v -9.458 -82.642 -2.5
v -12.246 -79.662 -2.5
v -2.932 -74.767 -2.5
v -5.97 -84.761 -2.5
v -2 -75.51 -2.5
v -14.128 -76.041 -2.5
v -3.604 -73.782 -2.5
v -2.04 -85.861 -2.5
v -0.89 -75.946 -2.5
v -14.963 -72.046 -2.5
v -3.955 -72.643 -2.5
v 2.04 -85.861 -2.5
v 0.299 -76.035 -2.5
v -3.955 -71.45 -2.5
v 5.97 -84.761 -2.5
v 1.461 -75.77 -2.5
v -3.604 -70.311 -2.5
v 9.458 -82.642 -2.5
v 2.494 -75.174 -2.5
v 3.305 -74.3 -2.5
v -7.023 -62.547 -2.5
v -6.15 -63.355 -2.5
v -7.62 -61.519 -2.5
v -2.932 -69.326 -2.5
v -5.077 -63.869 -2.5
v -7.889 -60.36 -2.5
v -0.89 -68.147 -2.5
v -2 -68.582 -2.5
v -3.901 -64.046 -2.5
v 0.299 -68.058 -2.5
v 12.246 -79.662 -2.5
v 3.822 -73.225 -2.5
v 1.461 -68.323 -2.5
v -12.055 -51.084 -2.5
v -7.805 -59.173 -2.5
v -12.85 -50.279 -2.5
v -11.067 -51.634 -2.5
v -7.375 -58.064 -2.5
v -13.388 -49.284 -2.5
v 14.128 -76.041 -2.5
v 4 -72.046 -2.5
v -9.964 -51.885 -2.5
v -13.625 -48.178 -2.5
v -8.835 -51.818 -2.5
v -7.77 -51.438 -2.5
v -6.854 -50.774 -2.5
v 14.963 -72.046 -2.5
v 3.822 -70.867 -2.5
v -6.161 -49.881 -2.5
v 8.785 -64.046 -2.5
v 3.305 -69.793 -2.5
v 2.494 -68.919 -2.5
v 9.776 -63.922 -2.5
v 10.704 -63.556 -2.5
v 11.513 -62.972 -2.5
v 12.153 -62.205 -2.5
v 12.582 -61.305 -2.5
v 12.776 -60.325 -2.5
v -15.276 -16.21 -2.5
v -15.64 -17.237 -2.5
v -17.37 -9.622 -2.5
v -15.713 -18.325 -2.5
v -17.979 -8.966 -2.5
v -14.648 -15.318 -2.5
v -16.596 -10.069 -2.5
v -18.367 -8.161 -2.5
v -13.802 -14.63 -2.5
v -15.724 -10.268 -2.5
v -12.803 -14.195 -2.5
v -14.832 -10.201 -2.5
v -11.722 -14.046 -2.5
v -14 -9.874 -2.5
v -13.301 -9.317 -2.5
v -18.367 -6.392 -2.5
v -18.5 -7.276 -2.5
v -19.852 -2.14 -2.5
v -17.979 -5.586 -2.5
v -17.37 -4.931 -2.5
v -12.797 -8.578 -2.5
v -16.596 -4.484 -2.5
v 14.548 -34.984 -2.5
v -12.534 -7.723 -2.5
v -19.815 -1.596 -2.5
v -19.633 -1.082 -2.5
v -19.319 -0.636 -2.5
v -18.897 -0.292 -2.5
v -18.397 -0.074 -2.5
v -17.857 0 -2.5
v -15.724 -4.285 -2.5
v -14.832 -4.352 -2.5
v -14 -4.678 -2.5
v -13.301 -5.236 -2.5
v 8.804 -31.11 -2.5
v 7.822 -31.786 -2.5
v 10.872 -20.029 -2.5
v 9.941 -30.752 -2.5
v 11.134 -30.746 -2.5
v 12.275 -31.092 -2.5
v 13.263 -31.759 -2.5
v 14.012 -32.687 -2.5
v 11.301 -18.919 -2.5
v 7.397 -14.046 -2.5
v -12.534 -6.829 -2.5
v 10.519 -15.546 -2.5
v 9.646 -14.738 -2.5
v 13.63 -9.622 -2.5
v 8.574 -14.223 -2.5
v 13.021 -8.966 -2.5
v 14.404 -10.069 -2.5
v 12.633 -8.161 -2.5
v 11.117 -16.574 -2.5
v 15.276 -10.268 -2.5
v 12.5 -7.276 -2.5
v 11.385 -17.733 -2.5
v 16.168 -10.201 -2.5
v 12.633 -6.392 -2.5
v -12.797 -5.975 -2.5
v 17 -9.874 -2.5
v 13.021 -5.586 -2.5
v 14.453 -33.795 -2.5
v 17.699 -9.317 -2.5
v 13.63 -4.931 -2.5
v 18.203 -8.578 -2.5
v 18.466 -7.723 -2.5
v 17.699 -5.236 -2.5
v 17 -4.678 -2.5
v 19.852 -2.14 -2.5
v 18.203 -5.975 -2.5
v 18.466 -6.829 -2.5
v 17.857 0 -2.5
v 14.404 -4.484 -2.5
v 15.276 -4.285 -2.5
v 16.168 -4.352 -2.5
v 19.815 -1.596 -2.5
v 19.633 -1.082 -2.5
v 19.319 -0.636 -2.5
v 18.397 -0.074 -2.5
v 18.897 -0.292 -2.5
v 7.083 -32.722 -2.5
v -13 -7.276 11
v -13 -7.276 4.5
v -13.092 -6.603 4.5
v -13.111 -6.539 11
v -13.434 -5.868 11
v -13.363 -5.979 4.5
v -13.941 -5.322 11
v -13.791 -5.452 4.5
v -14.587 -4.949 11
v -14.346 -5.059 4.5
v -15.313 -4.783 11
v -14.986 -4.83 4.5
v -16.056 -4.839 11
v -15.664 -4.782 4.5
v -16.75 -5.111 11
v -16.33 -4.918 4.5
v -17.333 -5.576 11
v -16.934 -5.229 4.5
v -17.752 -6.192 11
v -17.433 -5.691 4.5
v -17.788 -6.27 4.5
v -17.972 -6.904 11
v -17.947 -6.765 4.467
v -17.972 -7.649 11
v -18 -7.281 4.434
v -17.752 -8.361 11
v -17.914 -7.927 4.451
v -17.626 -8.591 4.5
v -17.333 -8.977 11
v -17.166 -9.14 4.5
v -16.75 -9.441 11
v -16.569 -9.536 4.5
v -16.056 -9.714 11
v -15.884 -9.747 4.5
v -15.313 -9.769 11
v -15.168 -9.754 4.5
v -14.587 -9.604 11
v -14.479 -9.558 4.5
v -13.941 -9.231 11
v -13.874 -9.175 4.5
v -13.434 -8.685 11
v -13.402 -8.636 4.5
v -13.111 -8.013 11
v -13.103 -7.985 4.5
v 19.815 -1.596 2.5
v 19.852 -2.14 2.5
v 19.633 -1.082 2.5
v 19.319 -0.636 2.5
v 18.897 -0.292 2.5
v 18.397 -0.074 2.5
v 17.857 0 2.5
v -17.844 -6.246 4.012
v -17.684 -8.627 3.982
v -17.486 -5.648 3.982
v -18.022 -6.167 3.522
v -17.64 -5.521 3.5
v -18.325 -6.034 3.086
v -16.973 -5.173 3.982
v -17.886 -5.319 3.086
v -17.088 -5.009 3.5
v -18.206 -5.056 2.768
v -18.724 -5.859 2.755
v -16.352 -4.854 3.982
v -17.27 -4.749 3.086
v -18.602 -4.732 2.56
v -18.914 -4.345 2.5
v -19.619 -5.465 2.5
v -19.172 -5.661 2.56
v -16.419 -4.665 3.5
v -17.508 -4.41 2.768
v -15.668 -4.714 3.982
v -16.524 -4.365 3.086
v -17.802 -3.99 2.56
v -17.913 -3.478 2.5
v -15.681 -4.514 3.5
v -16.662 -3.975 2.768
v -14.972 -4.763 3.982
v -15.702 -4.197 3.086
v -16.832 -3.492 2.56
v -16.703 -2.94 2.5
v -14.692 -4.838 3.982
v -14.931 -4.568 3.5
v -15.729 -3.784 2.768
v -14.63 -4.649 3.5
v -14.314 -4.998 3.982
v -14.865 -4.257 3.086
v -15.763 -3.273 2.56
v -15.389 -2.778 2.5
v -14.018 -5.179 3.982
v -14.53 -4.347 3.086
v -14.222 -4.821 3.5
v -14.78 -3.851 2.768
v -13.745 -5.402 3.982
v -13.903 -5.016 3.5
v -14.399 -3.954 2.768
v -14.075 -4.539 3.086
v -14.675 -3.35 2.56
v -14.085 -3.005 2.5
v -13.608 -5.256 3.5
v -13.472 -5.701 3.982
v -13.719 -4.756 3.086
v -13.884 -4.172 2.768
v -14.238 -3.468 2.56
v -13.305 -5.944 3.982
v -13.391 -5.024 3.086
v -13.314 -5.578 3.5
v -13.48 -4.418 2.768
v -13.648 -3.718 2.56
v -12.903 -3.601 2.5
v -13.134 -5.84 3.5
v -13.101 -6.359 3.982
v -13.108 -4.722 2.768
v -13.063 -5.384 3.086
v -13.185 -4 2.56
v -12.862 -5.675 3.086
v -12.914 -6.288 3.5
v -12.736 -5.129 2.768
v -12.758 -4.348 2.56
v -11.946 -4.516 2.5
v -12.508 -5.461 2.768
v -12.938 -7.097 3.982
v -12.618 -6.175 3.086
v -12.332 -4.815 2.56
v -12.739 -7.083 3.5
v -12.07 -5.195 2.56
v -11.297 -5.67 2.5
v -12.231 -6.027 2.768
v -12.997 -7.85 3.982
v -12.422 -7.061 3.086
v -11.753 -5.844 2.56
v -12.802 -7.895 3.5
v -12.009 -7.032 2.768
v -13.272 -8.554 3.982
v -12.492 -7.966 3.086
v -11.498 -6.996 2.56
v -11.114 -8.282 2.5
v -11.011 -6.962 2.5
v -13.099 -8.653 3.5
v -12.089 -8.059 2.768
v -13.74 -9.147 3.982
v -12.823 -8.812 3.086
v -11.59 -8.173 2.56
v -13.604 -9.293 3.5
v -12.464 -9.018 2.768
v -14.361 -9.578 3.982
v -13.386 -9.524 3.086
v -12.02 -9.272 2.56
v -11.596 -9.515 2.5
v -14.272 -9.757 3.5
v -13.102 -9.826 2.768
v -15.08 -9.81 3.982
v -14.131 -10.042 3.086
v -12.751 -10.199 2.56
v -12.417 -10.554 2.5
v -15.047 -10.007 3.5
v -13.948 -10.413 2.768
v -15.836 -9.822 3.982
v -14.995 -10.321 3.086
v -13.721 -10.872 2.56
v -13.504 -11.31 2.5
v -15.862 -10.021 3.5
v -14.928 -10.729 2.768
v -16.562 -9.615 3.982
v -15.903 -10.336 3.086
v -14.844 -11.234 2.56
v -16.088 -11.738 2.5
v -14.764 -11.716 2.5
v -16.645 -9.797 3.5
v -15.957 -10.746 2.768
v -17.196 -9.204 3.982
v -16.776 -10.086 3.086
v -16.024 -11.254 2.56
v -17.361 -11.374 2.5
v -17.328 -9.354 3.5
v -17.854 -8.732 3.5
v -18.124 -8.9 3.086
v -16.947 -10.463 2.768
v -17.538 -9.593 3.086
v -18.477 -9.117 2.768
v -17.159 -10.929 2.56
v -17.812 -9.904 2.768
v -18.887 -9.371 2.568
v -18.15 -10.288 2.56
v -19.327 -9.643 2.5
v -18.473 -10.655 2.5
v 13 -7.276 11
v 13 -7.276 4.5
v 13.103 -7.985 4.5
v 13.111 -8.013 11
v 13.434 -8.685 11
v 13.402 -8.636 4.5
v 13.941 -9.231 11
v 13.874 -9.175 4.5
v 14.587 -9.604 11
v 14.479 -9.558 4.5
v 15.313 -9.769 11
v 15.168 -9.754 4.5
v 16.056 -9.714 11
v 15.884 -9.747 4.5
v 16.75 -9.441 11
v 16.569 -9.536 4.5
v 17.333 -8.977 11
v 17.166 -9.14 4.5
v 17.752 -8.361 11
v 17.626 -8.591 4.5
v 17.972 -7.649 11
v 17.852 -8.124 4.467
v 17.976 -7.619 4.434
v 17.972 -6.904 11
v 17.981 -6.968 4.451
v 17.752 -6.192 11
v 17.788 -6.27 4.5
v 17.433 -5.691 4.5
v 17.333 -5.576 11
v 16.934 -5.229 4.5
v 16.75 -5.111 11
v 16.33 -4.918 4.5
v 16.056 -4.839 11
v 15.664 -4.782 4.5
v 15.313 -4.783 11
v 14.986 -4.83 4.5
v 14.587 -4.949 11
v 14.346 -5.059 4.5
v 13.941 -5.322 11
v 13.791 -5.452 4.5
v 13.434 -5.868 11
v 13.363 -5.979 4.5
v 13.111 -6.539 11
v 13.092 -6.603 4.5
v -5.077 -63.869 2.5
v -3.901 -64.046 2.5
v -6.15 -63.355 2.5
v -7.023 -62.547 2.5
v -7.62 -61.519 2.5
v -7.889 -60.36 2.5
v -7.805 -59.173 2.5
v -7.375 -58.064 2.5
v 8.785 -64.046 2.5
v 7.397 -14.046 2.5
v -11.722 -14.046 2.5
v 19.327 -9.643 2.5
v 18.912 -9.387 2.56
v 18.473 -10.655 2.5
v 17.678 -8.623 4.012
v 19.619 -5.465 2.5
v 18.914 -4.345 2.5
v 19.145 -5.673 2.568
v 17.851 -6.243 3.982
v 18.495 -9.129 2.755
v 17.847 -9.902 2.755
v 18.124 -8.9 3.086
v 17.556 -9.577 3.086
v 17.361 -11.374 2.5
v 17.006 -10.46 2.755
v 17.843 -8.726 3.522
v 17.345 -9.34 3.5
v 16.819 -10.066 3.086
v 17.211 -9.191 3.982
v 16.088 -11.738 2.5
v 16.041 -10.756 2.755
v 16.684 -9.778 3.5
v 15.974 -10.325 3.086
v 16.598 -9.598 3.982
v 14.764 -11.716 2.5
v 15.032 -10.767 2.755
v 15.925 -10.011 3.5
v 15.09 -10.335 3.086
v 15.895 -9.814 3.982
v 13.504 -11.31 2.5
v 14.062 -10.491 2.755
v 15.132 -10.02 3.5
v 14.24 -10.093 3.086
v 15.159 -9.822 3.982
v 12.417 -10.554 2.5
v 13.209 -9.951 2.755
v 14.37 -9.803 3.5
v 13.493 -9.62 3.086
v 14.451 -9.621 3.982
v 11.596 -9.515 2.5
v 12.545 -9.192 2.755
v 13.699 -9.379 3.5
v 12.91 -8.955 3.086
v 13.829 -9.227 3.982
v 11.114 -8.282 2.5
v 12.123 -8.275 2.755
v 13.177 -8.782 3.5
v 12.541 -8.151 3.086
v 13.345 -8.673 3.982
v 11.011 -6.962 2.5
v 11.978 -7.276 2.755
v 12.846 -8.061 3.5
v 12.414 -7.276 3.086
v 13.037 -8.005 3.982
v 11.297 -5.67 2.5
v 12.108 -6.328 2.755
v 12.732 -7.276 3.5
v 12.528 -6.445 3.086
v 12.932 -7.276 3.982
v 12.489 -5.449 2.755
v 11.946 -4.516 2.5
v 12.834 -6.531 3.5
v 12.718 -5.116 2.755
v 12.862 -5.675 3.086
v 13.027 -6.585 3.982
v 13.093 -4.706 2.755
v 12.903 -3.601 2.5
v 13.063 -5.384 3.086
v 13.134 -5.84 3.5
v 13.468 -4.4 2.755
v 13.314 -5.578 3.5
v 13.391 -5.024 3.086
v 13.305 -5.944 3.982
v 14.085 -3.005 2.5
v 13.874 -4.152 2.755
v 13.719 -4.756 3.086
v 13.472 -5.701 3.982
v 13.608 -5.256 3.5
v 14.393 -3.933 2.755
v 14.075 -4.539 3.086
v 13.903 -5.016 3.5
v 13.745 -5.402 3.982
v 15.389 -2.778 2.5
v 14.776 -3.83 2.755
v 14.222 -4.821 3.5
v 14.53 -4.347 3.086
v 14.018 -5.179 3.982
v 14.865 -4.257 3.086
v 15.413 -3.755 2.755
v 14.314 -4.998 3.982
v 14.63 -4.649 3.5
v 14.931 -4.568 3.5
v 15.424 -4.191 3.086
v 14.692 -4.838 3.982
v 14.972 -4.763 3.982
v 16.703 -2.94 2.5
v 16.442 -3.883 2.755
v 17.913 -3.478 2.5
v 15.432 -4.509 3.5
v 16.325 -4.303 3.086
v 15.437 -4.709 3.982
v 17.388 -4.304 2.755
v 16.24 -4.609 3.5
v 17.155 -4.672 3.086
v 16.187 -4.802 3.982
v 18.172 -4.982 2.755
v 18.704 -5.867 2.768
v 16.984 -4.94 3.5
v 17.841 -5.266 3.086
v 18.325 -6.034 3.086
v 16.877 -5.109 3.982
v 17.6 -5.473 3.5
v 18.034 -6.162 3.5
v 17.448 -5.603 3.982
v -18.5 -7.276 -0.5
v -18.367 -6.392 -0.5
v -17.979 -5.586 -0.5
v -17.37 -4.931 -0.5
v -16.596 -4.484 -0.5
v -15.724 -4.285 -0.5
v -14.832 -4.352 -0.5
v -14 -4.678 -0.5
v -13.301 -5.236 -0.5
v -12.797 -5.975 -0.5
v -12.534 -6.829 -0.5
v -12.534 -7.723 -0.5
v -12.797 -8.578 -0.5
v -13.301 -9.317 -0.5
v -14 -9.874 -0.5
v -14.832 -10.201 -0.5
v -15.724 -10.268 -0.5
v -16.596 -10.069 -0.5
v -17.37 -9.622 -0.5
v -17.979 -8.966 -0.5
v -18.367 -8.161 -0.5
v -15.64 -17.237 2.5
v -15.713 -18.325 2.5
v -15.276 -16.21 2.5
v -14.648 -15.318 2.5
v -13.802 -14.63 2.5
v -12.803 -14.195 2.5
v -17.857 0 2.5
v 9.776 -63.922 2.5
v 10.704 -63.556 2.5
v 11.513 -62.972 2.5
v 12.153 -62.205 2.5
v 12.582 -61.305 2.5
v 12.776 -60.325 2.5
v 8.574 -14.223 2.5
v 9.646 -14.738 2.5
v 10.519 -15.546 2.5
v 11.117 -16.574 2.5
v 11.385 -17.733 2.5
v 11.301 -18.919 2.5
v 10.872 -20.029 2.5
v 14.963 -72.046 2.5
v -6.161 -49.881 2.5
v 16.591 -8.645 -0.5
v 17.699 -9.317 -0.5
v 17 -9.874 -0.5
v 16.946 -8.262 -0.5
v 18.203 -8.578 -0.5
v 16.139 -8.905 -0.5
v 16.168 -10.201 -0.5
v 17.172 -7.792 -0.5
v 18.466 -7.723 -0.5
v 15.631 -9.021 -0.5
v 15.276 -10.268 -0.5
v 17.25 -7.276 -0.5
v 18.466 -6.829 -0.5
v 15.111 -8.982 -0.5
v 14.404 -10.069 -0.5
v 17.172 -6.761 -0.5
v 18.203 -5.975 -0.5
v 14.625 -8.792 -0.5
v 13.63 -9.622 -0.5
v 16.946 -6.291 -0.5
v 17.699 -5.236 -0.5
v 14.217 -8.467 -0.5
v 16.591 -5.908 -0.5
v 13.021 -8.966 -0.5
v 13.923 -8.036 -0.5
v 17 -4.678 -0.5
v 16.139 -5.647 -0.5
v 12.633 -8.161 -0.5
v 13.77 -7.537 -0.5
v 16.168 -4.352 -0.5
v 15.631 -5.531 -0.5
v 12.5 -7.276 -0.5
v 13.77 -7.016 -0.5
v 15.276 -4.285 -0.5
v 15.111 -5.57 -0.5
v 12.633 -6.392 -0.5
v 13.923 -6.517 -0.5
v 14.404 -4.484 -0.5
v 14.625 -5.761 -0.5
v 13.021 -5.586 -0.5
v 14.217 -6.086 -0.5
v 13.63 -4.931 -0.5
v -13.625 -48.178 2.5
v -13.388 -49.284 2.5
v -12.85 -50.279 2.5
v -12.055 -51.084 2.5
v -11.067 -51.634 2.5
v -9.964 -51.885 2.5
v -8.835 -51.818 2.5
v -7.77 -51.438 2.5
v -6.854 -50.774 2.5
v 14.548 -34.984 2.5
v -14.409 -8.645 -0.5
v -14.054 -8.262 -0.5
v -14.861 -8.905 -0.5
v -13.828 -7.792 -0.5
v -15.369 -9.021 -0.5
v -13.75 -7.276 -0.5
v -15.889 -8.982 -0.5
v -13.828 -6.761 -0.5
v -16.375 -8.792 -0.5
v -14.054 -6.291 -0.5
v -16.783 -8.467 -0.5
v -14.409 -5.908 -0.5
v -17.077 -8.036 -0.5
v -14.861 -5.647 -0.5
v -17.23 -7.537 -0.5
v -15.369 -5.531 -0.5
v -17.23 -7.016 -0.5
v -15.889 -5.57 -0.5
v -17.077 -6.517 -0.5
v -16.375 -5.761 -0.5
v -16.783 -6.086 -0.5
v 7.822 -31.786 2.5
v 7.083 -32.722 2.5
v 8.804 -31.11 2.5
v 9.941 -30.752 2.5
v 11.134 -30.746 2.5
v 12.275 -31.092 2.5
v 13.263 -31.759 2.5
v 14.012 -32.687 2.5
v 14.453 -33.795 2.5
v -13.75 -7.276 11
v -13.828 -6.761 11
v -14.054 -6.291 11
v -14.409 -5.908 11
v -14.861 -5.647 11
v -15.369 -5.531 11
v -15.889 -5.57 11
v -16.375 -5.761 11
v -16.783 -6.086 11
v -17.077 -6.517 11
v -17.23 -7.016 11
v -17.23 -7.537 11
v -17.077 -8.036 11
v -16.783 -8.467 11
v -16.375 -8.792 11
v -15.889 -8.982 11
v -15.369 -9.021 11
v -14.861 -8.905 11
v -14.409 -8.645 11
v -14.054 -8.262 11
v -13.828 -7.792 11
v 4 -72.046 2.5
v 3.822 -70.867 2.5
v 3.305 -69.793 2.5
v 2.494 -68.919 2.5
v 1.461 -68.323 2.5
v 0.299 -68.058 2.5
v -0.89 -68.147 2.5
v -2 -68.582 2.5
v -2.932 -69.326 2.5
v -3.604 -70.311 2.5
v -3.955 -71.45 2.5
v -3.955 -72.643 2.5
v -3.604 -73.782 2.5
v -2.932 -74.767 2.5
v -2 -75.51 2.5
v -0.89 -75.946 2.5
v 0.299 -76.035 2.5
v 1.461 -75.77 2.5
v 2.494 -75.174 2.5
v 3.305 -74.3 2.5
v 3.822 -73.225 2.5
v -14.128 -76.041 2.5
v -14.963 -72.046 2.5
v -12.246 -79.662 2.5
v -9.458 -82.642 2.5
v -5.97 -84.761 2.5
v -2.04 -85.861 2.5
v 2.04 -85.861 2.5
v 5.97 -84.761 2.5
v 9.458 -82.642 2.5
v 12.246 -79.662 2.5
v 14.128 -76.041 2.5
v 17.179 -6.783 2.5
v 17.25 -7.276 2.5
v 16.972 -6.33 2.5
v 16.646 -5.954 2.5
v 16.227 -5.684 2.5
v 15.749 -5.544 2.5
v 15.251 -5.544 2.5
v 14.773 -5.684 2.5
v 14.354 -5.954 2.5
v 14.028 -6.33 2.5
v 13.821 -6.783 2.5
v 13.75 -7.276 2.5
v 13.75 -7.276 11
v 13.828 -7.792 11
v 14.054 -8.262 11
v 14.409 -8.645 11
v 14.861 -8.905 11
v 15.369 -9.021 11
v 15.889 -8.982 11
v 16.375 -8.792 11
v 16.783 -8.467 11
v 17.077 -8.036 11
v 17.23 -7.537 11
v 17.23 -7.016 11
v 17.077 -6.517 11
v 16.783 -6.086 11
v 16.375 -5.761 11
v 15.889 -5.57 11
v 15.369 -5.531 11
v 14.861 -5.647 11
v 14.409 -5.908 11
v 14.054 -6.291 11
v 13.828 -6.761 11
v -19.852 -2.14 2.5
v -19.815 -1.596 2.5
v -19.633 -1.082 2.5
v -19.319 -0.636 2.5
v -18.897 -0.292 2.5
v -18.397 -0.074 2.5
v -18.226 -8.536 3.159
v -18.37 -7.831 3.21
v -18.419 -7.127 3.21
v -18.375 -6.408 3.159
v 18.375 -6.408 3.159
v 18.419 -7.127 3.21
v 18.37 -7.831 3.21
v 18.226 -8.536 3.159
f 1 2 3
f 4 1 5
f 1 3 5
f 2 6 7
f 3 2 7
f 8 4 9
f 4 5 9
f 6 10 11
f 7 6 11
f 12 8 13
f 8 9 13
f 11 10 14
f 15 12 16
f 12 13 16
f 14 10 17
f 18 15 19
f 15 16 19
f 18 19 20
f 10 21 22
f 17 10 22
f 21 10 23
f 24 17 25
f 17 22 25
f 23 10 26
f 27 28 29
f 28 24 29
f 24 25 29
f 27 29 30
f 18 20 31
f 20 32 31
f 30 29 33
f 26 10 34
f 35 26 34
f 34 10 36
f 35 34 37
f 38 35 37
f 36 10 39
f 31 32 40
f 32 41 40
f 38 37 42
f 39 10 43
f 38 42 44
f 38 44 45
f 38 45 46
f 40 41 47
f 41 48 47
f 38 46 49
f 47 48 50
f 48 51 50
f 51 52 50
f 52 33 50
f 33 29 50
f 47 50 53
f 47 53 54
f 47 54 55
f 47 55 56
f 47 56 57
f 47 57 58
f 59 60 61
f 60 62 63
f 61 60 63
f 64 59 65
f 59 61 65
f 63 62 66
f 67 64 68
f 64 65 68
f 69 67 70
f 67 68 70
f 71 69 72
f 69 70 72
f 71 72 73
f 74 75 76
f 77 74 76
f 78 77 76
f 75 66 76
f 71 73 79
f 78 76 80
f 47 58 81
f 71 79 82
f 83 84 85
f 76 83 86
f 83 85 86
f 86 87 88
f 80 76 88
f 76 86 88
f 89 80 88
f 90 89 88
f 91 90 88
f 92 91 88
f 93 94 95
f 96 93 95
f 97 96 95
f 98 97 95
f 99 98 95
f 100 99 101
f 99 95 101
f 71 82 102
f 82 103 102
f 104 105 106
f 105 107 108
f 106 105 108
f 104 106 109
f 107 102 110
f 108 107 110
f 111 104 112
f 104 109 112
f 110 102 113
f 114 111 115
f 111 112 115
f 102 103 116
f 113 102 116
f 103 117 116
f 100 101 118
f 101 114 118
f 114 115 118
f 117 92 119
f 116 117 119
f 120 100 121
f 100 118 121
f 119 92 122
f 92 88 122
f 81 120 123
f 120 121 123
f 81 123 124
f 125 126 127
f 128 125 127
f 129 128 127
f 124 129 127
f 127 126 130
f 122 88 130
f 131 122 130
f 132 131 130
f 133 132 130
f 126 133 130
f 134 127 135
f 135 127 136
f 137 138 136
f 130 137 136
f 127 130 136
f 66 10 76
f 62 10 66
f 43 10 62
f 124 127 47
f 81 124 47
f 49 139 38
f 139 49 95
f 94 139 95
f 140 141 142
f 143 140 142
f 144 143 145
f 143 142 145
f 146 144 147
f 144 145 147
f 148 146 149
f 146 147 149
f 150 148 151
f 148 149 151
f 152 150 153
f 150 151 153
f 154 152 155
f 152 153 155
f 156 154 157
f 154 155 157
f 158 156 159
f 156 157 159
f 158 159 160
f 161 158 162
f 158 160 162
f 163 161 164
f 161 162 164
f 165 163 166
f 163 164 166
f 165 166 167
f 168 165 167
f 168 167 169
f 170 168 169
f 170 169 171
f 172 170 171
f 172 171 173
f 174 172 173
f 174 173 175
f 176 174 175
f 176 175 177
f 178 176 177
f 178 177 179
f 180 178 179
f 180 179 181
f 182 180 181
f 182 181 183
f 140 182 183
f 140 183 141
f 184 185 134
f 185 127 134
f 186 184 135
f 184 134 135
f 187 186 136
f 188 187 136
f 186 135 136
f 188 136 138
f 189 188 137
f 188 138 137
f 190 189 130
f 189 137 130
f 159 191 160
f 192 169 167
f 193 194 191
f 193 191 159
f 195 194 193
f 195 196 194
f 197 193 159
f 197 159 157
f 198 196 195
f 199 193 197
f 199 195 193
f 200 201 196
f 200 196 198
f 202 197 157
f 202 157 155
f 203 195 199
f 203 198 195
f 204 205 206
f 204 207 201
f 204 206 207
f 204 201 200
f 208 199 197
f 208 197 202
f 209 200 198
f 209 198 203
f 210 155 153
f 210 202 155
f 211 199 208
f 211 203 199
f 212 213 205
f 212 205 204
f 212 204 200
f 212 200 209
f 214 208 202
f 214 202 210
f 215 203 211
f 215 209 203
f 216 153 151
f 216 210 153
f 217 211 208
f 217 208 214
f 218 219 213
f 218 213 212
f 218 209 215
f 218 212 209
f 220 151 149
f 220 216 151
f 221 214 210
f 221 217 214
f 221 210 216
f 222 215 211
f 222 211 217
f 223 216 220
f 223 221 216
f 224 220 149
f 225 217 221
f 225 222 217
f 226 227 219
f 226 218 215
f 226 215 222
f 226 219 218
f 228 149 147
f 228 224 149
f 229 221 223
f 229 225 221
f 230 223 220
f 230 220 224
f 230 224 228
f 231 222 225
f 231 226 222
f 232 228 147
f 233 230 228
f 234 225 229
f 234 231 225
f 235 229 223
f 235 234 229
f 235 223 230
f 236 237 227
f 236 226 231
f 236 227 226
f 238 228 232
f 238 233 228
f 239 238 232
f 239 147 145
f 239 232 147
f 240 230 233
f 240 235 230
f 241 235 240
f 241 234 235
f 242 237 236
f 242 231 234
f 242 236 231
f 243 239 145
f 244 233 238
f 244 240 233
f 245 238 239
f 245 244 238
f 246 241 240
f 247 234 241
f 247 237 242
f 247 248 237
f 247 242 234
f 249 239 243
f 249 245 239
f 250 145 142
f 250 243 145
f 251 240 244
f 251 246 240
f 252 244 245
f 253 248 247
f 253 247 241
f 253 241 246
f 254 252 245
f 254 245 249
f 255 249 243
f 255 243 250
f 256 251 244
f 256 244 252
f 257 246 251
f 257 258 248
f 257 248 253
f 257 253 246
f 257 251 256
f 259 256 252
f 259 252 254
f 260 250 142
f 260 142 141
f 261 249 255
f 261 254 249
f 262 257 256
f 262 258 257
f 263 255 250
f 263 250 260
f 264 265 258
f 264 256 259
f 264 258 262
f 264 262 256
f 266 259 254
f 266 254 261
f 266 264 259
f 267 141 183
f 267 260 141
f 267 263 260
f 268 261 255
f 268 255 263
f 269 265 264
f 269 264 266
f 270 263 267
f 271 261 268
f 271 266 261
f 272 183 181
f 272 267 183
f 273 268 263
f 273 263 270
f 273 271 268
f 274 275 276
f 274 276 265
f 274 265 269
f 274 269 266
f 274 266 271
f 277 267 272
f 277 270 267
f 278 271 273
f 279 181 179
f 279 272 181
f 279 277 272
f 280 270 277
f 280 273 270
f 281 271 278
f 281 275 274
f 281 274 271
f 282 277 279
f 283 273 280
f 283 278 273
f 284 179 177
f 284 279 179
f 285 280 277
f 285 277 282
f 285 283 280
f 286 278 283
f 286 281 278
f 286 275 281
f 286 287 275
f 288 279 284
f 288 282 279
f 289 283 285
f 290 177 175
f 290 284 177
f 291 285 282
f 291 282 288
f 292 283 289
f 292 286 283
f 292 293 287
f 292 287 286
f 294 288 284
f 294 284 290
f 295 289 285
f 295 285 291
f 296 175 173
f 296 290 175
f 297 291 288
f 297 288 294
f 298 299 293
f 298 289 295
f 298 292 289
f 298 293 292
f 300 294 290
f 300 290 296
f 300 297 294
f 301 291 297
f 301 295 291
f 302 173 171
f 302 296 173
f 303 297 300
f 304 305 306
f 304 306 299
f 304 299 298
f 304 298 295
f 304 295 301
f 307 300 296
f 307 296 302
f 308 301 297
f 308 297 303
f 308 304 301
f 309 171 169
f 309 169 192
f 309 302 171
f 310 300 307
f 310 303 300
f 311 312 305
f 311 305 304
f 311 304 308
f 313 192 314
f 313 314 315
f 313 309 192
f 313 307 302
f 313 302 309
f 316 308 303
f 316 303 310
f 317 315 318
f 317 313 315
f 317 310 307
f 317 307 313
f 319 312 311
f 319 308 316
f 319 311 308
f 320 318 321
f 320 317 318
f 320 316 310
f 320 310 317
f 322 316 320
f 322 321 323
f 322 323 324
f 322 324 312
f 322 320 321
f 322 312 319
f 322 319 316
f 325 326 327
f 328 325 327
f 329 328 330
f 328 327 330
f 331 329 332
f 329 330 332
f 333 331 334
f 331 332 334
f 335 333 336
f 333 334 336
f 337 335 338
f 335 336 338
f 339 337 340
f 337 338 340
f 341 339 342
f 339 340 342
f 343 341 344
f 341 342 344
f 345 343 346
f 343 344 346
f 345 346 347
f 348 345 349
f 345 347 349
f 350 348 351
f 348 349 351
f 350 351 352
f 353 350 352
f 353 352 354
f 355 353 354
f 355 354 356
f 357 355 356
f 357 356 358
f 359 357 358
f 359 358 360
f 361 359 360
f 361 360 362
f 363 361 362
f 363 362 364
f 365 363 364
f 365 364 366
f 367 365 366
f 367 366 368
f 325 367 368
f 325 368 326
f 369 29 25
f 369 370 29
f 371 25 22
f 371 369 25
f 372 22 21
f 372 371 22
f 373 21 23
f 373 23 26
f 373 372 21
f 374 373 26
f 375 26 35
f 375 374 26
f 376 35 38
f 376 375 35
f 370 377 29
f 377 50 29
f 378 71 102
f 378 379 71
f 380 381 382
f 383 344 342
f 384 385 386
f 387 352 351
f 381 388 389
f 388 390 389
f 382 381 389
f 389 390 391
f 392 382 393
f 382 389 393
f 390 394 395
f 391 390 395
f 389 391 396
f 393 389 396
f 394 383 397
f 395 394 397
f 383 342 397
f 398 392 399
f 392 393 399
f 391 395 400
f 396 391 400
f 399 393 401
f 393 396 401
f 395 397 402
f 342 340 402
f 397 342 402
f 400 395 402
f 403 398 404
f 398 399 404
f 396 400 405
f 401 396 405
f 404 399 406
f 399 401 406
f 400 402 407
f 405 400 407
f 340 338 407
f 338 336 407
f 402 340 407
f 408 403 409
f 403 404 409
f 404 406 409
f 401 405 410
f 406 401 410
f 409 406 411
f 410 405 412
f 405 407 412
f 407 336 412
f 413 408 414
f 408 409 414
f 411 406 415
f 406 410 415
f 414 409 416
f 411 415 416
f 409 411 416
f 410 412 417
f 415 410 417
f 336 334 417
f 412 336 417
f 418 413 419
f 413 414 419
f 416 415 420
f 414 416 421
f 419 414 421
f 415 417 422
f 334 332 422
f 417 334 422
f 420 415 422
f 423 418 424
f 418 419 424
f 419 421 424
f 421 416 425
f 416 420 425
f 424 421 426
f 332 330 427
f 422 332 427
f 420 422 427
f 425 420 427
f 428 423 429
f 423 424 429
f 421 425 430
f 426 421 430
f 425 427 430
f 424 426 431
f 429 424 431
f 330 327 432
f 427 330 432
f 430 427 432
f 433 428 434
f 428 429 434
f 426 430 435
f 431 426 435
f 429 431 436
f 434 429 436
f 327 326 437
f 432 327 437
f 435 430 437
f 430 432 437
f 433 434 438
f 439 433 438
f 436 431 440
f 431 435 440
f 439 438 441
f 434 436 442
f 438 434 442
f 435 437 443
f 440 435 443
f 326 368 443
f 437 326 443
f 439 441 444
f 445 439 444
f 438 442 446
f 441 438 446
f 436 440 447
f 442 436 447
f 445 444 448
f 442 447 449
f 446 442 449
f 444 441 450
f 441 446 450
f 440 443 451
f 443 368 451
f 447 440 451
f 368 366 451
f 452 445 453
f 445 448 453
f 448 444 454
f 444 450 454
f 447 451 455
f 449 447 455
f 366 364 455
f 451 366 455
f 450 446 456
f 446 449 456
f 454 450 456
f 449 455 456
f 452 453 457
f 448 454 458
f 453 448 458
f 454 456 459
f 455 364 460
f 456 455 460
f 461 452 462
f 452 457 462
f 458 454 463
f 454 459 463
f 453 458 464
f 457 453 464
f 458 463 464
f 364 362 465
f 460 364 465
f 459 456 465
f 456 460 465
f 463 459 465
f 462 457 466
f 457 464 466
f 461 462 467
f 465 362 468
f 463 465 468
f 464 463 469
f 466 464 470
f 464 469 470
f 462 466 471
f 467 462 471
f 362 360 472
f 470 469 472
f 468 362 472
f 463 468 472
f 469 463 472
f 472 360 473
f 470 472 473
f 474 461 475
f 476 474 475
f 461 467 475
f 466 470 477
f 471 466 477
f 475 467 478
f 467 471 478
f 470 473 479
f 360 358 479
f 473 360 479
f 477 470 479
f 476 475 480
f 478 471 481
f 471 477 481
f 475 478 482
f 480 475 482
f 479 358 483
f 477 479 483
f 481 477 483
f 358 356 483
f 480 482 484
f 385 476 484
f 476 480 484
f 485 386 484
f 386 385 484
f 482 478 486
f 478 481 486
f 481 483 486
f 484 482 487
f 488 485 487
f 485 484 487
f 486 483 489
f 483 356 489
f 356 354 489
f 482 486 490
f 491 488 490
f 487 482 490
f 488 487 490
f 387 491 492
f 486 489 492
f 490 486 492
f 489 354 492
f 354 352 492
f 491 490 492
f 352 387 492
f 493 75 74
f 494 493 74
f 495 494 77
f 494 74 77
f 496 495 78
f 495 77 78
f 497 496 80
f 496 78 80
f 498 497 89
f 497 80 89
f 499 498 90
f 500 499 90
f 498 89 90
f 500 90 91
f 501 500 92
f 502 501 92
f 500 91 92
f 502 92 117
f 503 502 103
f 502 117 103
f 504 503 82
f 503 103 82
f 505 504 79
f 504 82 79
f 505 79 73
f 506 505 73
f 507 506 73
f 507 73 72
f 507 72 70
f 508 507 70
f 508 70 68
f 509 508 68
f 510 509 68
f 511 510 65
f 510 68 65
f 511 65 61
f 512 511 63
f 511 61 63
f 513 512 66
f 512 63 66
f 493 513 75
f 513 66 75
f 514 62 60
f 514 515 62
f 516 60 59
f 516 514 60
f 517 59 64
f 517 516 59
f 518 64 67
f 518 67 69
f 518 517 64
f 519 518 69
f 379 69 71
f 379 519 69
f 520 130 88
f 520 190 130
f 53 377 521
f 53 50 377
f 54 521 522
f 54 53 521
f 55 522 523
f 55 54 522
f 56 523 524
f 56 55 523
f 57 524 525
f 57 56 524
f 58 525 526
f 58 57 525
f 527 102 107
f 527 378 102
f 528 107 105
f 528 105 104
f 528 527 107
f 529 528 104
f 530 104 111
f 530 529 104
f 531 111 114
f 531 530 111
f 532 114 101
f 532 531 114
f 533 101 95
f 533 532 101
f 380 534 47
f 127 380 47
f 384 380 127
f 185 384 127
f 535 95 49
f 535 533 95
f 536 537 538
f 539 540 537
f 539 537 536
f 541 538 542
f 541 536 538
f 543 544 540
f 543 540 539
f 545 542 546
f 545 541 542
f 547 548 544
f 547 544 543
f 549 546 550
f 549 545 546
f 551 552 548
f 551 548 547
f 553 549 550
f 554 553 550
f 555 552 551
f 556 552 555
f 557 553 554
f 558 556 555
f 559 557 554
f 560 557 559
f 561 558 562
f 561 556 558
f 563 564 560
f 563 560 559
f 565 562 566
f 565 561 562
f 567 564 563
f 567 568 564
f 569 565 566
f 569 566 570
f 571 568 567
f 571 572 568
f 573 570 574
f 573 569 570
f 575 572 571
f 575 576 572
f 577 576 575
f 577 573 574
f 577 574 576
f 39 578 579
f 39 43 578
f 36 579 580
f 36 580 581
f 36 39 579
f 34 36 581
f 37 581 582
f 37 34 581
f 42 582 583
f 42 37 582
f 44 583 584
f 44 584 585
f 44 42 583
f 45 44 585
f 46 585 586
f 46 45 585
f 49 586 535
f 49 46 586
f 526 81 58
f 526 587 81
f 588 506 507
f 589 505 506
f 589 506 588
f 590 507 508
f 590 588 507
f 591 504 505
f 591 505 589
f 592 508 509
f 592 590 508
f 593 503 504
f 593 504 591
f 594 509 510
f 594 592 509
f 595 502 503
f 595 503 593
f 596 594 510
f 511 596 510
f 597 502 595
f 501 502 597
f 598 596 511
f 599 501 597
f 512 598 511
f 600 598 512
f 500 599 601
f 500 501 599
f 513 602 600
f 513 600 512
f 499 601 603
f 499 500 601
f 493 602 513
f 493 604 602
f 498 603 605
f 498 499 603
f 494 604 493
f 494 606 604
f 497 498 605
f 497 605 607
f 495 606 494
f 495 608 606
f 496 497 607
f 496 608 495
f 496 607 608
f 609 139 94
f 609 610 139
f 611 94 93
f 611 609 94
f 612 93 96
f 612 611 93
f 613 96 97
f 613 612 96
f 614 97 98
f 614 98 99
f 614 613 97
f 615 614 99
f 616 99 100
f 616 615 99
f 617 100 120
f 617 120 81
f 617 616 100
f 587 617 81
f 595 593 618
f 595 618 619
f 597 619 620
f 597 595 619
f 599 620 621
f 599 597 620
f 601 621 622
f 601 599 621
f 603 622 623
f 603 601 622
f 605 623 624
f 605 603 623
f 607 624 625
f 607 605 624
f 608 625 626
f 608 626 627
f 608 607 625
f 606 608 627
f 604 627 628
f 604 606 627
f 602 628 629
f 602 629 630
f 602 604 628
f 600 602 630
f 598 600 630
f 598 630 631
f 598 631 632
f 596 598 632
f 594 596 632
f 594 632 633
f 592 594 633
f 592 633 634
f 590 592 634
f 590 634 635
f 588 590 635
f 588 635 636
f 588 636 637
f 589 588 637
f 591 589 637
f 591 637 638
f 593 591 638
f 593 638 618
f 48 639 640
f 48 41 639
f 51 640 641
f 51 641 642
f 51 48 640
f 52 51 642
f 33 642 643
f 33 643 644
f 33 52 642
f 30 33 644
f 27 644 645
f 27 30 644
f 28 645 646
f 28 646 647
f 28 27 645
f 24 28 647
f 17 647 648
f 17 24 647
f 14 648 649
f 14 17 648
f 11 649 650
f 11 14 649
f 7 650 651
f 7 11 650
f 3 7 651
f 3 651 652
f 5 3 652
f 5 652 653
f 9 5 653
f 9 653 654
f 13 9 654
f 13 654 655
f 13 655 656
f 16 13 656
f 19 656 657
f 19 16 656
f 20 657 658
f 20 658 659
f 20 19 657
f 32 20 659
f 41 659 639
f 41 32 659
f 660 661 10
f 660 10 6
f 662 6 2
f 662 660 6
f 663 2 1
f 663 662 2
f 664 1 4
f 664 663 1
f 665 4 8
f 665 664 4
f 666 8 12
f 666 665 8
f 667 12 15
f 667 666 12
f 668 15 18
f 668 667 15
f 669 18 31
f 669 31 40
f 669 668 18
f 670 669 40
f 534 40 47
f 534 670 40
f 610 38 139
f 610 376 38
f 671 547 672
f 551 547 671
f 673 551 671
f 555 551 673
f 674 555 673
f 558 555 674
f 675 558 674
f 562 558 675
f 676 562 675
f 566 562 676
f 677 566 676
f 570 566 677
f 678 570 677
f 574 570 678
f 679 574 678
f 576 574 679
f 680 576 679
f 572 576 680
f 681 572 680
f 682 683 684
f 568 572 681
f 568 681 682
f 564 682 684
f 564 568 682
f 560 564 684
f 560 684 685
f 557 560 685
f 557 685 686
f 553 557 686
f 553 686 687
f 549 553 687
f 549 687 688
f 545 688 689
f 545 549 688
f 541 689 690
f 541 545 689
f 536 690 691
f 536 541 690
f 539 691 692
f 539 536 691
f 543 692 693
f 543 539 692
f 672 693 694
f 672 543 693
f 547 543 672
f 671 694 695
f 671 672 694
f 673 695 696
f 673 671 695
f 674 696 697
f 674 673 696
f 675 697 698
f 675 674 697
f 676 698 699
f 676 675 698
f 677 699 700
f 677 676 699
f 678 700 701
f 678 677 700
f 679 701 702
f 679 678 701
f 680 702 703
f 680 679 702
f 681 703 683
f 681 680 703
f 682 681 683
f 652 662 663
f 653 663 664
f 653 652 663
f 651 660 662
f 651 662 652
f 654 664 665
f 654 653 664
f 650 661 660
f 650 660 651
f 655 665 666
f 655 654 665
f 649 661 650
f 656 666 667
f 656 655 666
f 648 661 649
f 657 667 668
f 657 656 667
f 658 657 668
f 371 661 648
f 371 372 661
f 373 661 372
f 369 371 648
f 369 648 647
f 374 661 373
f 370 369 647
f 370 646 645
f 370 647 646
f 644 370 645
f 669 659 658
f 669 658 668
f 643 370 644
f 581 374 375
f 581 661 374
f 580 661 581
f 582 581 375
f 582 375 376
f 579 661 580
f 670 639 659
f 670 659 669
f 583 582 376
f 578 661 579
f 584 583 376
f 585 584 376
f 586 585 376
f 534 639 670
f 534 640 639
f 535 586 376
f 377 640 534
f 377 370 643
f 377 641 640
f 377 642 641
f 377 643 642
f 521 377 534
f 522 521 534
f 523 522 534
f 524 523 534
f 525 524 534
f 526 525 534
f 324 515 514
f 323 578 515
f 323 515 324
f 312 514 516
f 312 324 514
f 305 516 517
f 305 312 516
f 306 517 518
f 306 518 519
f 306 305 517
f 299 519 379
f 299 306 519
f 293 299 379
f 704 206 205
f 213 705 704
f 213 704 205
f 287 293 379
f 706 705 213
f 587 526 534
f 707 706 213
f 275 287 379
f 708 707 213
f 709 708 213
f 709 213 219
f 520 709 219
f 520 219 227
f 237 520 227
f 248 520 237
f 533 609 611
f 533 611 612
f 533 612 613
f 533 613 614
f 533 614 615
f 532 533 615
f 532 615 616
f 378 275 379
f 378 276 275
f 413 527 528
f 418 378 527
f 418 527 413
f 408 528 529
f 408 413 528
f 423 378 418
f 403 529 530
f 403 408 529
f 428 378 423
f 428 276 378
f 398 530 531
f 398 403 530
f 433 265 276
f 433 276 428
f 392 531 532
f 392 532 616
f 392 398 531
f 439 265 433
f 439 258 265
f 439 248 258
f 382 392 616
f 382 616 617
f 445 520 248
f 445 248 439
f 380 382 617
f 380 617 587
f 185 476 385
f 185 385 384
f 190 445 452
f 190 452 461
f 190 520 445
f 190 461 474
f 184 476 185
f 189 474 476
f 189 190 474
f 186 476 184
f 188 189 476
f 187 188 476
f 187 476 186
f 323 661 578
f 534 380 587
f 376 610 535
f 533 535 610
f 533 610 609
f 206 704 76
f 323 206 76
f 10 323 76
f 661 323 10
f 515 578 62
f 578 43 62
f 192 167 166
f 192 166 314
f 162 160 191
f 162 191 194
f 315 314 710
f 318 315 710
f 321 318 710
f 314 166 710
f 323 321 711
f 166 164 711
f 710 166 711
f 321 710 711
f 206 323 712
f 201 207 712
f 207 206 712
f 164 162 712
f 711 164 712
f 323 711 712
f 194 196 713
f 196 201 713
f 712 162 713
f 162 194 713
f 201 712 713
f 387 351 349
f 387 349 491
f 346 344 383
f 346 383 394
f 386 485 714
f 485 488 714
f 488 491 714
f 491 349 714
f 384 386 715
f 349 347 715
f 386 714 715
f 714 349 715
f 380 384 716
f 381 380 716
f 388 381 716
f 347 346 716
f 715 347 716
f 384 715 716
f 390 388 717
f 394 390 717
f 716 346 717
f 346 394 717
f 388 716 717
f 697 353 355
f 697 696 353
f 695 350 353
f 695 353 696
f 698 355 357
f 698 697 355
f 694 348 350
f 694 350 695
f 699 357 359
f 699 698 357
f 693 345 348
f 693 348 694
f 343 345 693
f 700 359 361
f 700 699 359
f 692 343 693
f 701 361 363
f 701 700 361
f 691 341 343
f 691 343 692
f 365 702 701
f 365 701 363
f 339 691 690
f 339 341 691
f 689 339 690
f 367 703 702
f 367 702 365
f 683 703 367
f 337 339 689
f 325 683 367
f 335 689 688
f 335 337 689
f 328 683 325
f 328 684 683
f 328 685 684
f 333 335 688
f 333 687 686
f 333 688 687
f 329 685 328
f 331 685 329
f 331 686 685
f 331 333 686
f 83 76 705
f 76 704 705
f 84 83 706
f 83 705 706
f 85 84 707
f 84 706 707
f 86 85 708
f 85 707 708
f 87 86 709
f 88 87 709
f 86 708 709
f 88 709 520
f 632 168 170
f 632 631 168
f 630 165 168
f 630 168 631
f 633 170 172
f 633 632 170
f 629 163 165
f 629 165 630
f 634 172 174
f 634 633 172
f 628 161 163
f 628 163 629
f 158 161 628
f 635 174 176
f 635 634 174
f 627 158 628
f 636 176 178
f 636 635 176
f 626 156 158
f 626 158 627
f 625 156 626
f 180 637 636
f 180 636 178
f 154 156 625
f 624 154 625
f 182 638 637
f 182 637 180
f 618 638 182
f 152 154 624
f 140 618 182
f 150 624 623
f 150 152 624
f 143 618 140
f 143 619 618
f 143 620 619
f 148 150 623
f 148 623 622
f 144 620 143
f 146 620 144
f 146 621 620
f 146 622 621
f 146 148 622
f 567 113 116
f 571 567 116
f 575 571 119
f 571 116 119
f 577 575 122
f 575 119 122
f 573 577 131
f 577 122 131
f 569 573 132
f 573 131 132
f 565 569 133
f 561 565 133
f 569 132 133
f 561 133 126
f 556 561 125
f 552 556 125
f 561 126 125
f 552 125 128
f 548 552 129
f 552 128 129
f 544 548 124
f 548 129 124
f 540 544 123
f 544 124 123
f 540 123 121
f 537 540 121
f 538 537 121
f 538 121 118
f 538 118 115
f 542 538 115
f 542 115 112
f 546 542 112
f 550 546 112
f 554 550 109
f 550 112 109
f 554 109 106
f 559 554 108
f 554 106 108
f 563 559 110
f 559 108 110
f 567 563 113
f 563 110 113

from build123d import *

# Parameters (mm, degrees)
CROQUIS1_R              = 4
CROQUIS1_R_2            = 1.75
SALIENTE_EXTRUIR1_DEPTH = 2.5
CROQUIS1_3_R            = 2.5
CROQUIS1_3_R_2          = 1.75
SALIENTE_EXTRUIR2_DEPTH = 11
REDONDEO1_R             = 2
REDONDEO2_R             = 2
CROQUIS2_R              = 3
CORTAR_EXTRUIR1_DEPTH   = 2
REDONDEO3_R             = 4


with BuildPart() as part:
    # Croquis1 → Saliente-Extruir1 (new, symmetric)
    with BuildSketch(Plane.XY):
        with BuildLine():
            Line((20.001432119, 0), (-20.001432119, 0))
            Line((-20.001432119, 0), (-14.963460754, -72.046347106))
            ThreePointArc((-14.963460754, -72.046347106), (0, -86), (14.963460754, -72.046347106))
            Line((14.963460754, -72.046347106), (20.001432119, 0))
        make_face()
        with Locations((0, -72.046347106)):
            Circle(CROQUIS1_R, mode=Mode.SUBTRACT)
        Polygon((-12.704099543, -61.349956664), (-16.011890152, -14.046347106), (14.28491785, -14.046347106), align=None, mode=Mode.SUBTRACT)
        Polygon((12.515549555, -64.046347106), (-10.788577252, -64.046347106), (15.770666891, -17.496000466), align=None, mode=Mode.SUBTRACT)
        with Locations((-15.5, -7.276347106)):
            Circle(CROQUIS1_R_2, mode=Mode.SUBTRACT)
        with Locations((15.5, -7.276347106)):
            Circle(CROQUIS1_R_2, mode=Mode.SUBTRACT)
    extrude(amount=SALIENTE_EXTRUIR1_DEPTH, both=True)

    # Croquis1<3> → Saliente-Extruir2 (add)
    # profile 1 of 2: a face of its own
    with BuildSketch(Plane.XY):
        with Locations((-15.5, -7.276347106)):
            Circle(CROQUIS1_3_R)
        with Locations((-15.5, -7.276347106)):
            Circle(CROQUIS1_3_R_2, mode=Mode.SUBTRACT)
    # profile 2 of 2: a face of its own
    with BuildSketch(Plane.XY):
        with Locations((15.5, -7.276347106)):
            Circle(CROQUIS1_3_R)
        with Locations((15.5, -7.276347106)):
            Circle(CROQUIS1_3_R_2, mode=Mode.SUBTRACT)
    extrude(amount=SALIENTE_EXTRUIR2_DEPTH)

    # Redondeo1
    redondeo1_edges = [part.edges().sort_by_distance(p)[0] for p in [
        (13, -7.276347106, 2.5),
        (-18, -7.276347106, 2.5),
    ]]
    fillet(redondeo1_edges, radius=REDONDEO1_R)

    # Redondeo2
    redondeo2_edges = [part.edges().sort_by_distance(p)[0] for p in [
        (20.001432119, 0, 0),
        (-20.001432119, 0, 0),
    ]]
    fillet(redondeo2_edges, radius=REDONDEO2_R)

    # Croquis2 → Cortar-Extruir1 (cut)
    with BuildSketch(Plane(origin=(0, 0, -2.5), x_dir=(-1, 0, 0), z_dir=(0, 0, -1))):
        with Locations((-15.5, -7.276347106)):
            Circle(CROQUIS2_R)
        with Locations((15.5, -7.276347106)):
            Circle(CROQUIS2_R)
    extrude(amount=-CORTAR_EXTRUIR1_DEPTH, mode=Mode.SUBTRACT)

    # Redondeo3
    redondeo3_edges = [part.edges().sort_by_distance(p)[0] for p in [
        (-16.011890152, -14.046347106, 0),
        (12.515549555, -64.046347106, 0),
        (-10.788577252, -64.046347106, 0),
        (-12.704099543, -61.349956664, 0),
        (14.28491785, -14.046347106, 0),
        (15.770666891, -17.496000466, 0),
    ]]
    fillet(redondeo3_edges, radius=REDONDEO3_R)


solid = part.part
